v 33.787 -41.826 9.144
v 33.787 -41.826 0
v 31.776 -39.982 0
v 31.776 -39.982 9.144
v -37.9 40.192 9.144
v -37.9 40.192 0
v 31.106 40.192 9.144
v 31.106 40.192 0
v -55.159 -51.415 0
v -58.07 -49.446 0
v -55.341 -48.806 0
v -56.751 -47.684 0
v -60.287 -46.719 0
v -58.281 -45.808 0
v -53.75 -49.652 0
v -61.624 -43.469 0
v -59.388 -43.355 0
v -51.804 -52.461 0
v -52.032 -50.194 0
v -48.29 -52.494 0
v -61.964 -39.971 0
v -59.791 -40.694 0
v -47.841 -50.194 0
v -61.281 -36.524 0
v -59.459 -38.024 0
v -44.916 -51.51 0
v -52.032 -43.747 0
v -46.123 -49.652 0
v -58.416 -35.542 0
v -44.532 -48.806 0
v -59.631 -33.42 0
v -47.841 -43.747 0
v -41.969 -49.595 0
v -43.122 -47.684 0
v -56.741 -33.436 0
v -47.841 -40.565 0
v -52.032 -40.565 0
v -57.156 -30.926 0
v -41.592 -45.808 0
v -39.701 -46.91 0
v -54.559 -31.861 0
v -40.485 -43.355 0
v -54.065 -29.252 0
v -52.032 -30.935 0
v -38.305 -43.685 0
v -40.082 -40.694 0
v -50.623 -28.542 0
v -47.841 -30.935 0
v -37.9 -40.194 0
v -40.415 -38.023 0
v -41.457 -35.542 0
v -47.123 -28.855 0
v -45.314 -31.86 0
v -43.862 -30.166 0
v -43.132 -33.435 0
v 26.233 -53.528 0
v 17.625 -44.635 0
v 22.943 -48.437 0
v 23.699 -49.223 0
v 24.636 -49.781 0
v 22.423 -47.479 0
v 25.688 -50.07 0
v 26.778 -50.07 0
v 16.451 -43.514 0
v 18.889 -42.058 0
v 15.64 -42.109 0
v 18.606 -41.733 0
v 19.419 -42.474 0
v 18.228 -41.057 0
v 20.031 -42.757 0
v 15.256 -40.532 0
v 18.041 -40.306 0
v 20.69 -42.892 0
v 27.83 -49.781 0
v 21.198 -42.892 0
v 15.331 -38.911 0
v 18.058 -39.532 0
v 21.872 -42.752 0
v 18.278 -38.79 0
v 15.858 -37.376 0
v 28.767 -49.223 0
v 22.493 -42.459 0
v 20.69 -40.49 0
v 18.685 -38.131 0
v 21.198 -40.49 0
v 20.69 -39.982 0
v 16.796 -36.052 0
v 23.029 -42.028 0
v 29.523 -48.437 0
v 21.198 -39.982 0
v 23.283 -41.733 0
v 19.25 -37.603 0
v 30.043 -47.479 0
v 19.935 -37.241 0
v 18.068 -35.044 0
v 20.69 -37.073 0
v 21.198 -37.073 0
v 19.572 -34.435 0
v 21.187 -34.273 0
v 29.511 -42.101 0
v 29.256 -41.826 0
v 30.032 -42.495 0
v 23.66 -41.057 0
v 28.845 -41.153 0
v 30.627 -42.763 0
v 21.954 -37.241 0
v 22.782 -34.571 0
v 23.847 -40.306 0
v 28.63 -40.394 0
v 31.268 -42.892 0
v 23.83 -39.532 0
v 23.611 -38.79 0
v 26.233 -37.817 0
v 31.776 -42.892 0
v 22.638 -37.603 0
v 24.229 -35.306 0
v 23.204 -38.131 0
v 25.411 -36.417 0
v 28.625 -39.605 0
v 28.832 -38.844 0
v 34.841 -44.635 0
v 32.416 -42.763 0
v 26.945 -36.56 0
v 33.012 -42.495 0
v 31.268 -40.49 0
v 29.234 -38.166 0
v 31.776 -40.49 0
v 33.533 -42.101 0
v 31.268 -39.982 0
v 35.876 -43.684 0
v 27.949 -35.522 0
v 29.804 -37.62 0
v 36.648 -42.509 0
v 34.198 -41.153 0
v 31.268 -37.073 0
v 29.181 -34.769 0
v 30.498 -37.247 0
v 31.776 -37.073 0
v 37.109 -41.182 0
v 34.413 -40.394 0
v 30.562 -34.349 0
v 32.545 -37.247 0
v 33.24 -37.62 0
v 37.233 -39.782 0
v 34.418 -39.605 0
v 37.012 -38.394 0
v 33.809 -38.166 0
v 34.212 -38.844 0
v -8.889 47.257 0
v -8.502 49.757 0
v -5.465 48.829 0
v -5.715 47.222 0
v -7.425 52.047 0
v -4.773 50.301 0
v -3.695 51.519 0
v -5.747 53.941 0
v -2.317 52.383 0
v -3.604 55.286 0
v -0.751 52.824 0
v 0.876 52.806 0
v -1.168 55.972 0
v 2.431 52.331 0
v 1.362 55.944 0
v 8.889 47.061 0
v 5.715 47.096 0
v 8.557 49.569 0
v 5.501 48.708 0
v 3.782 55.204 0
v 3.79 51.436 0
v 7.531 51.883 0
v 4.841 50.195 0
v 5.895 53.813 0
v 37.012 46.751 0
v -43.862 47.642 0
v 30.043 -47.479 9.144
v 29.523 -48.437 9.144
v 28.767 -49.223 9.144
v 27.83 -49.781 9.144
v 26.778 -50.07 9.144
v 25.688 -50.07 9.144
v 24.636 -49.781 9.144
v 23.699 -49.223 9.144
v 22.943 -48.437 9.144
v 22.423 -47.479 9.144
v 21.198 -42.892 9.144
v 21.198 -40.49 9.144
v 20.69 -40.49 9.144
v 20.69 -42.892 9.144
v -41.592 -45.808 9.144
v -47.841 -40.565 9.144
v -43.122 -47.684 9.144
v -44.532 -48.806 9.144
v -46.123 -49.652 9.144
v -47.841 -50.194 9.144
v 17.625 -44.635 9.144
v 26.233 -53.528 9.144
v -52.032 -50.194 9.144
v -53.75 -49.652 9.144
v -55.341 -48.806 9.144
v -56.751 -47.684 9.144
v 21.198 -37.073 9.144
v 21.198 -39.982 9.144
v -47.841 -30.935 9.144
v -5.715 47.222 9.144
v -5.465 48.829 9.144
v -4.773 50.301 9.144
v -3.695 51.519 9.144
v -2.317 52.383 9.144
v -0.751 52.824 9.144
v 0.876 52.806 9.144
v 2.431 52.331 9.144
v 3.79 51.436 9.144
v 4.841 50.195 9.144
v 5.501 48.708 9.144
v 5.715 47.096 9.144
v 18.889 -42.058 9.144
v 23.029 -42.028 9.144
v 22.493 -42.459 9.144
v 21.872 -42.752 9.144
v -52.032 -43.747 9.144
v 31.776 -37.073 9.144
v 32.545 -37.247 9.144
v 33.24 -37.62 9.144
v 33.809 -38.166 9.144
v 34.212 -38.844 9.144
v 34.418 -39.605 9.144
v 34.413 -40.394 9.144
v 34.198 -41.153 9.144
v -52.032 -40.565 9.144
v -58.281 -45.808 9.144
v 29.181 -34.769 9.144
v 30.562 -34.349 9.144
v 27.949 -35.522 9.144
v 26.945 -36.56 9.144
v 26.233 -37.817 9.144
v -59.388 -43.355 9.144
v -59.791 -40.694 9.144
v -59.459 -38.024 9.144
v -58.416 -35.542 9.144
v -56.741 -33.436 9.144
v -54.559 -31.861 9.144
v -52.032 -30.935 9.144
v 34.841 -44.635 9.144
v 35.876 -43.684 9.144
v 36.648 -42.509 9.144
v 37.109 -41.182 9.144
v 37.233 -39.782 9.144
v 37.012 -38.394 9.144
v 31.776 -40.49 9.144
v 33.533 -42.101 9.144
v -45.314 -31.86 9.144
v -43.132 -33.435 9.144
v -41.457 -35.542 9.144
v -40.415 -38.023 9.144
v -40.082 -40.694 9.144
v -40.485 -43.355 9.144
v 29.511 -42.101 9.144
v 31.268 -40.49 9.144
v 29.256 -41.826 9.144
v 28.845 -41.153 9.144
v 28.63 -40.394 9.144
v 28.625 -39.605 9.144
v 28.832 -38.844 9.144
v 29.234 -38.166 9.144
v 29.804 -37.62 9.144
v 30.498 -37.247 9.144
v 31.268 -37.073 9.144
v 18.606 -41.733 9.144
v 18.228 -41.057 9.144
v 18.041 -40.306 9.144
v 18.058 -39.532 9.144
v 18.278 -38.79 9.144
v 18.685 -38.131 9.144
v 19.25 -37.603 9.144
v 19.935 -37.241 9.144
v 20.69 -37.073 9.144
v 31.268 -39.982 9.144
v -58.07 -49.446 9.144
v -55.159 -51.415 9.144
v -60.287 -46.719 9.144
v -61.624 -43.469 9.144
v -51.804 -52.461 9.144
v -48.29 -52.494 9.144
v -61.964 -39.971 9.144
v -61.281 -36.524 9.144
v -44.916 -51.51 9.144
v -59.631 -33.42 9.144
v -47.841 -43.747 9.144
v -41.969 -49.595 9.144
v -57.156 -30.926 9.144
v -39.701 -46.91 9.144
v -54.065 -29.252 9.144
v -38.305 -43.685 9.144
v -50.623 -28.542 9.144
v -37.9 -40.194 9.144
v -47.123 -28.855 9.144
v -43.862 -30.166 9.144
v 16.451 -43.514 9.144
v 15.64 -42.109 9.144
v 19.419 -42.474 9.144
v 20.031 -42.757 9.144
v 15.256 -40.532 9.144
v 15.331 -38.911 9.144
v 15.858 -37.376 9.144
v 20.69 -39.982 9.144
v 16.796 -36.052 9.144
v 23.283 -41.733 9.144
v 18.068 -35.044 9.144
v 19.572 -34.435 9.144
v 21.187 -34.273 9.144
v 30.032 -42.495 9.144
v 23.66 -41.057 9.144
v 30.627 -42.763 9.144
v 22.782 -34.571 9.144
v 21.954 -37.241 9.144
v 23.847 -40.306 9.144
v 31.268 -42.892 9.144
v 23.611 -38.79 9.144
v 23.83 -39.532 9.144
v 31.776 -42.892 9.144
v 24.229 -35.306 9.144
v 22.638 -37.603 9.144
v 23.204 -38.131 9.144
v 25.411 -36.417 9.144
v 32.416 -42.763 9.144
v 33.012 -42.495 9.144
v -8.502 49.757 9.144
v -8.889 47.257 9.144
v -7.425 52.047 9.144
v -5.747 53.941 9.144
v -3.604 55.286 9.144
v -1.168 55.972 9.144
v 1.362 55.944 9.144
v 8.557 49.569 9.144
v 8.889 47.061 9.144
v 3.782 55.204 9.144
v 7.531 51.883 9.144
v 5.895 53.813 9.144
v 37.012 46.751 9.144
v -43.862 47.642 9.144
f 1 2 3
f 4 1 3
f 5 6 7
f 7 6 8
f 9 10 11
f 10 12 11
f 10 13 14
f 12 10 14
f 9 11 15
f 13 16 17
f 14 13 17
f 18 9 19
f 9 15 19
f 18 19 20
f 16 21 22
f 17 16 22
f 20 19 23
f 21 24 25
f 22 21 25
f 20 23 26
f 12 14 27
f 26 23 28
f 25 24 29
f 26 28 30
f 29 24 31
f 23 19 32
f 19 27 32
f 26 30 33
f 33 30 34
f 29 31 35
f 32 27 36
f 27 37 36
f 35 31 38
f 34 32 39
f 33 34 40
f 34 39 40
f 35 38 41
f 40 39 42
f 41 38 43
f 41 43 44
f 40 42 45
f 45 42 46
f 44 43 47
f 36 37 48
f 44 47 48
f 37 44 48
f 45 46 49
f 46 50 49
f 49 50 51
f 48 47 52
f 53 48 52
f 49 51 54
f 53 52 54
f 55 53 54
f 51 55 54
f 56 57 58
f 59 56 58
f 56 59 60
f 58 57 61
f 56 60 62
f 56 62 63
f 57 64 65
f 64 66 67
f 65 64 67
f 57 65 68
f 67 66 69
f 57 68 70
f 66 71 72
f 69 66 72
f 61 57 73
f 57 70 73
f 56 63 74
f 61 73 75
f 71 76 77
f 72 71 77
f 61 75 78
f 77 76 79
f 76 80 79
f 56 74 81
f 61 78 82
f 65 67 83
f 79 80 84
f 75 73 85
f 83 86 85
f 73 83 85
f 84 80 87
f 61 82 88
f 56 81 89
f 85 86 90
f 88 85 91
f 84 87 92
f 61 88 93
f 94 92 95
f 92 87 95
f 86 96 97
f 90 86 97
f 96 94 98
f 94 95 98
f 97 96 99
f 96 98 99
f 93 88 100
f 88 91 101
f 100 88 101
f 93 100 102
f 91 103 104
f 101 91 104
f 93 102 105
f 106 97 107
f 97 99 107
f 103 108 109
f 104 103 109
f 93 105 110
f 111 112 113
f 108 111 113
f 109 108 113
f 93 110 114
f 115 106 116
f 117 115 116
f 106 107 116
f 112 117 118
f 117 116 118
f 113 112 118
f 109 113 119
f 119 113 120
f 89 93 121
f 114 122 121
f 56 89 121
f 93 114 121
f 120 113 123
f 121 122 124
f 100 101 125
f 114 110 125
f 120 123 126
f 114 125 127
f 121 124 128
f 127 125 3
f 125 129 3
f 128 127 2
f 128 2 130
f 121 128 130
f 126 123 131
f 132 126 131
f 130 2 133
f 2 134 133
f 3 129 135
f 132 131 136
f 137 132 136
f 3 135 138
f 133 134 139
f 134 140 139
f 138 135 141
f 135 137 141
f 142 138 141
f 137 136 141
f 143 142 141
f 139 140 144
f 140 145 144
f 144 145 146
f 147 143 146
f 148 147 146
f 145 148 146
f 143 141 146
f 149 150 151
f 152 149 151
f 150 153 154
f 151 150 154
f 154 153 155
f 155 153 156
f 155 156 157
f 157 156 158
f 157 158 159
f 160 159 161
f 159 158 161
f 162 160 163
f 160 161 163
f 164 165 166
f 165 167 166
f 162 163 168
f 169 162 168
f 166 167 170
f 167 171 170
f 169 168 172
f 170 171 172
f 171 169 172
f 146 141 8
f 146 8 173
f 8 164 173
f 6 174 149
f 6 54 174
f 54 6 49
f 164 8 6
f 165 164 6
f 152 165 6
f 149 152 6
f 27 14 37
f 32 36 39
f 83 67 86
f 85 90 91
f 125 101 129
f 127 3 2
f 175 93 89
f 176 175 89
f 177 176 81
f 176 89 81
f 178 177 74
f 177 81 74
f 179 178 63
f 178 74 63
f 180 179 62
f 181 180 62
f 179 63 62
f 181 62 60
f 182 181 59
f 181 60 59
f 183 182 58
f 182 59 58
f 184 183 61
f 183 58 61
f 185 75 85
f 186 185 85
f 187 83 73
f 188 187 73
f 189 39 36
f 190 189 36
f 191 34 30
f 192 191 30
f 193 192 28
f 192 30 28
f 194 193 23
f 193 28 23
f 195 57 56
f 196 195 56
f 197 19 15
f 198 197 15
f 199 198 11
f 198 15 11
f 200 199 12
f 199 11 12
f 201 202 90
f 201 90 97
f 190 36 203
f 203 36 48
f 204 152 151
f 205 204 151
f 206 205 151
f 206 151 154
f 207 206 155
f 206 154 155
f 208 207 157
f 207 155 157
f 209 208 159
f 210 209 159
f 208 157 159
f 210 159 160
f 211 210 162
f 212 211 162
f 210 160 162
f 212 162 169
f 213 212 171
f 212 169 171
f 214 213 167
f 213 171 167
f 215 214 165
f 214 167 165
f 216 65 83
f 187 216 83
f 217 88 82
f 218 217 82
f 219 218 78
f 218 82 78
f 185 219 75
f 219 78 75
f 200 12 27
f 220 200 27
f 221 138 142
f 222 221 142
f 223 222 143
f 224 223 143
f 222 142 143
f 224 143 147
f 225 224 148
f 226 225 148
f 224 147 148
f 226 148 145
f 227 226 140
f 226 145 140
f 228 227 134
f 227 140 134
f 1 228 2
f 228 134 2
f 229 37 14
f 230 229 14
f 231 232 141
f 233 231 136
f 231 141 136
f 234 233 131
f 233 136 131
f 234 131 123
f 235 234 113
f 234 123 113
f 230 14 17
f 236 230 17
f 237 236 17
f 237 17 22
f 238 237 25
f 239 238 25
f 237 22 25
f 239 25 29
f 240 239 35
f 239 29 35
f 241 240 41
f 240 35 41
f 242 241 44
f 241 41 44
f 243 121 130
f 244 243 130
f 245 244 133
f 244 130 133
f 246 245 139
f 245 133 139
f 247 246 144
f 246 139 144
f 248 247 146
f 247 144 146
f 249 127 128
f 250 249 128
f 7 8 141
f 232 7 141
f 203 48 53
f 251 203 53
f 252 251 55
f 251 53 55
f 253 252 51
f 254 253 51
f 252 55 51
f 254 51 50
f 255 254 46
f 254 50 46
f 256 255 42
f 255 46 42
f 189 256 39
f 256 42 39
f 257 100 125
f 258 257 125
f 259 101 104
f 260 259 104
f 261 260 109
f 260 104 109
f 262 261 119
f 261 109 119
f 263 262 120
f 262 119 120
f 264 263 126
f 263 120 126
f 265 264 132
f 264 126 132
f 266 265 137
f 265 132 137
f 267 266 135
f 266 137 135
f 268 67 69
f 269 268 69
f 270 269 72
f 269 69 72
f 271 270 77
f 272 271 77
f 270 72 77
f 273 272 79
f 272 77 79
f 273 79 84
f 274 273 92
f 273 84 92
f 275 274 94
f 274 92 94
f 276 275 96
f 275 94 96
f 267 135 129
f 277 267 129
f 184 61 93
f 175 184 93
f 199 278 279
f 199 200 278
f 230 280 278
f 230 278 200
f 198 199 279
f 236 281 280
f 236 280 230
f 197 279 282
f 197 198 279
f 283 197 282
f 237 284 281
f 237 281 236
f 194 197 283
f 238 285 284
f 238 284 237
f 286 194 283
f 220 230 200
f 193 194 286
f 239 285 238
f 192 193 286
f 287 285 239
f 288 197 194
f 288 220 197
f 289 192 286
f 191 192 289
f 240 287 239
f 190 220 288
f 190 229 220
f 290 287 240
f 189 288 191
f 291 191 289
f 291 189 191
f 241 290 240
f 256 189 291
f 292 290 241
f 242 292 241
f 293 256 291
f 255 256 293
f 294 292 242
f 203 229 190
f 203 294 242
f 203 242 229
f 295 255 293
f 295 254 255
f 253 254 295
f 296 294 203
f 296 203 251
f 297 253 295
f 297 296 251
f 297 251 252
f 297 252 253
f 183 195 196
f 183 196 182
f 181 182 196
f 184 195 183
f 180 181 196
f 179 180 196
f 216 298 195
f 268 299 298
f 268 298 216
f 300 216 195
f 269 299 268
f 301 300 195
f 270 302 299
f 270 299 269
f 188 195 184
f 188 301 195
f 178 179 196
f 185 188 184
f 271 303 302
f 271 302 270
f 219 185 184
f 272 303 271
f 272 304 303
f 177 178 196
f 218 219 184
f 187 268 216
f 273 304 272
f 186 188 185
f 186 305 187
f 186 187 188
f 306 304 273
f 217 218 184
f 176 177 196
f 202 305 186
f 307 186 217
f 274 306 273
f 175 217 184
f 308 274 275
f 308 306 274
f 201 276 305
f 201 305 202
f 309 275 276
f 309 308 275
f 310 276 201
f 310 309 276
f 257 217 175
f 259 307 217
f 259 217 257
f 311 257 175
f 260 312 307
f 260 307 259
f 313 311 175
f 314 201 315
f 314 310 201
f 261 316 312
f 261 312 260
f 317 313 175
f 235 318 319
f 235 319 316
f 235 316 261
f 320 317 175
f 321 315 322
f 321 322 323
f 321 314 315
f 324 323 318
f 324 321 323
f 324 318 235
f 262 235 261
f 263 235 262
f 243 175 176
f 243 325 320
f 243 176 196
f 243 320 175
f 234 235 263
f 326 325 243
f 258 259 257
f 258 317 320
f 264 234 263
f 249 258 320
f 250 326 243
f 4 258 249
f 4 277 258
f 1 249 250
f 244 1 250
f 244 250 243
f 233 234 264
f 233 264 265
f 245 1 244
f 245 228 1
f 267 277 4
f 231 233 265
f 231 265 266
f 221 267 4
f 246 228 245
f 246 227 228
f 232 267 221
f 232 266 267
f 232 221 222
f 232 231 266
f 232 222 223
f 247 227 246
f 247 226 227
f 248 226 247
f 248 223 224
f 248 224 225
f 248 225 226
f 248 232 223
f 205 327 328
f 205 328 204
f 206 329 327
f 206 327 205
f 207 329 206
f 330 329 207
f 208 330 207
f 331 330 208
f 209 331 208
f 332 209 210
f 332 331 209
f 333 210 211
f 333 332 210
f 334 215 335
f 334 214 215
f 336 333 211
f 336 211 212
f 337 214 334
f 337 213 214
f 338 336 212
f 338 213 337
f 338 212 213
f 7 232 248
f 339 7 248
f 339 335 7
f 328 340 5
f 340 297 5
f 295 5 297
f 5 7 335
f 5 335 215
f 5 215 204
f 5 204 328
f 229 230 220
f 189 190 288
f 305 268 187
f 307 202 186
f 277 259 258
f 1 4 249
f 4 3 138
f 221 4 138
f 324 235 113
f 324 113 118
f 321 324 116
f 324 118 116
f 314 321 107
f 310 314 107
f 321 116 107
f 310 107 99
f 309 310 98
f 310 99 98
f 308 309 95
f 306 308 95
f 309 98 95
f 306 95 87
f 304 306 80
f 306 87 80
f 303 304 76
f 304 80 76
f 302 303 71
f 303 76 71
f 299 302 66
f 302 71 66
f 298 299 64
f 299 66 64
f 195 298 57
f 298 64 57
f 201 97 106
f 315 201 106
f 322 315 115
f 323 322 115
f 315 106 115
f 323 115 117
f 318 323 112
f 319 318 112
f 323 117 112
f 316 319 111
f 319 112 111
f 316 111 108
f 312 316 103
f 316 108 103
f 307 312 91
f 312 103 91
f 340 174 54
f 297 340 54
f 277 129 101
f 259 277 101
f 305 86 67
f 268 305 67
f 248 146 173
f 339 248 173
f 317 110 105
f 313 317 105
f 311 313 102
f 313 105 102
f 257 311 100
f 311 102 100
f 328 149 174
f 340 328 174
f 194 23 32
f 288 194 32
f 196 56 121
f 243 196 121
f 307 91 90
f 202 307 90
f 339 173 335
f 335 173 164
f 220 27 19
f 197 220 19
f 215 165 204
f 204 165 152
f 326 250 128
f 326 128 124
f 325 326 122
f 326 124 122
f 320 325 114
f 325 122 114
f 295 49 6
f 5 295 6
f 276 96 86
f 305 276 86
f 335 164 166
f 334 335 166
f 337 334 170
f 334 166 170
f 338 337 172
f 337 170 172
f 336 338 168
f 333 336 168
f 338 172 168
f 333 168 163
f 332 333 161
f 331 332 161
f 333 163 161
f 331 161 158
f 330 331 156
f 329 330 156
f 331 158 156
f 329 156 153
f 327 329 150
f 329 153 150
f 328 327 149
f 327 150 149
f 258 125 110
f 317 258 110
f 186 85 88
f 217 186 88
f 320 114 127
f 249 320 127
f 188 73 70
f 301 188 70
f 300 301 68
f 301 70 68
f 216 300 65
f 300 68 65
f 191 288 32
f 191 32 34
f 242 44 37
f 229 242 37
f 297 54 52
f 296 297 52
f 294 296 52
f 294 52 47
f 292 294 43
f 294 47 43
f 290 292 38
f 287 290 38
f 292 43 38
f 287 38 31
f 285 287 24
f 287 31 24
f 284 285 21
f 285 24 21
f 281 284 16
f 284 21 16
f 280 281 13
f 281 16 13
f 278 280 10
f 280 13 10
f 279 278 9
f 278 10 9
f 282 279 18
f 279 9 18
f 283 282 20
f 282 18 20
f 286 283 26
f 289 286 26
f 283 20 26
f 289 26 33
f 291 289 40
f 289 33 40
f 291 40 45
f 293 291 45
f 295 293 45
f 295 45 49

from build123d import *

# Parameters (mm, degrees)
F1_DEPTH = 9.144


with BuildPart() as f1:
    # F0 (on Top) → F1 (new body)
    with BuildSketch(Plane.XY):
        with BuildLine():
            Line((26.232975, -53.528168), (34.841218, -44.634543))
            ThreePointArc((34.841218, -44.634543), (36.919466, -41.859873), (37.011544, -38.394412))
            Line((37.011544, -38.394412), (37.011544, -23.138775))
            Line((37.011544, -23.138775), (37.011544, 46.751468))
            Line((37.011544, 46.751468), (8.889462, 47.060993))
            ThreePointArc((8.889462, 47.060993), (0.097842, 56.048297), (-8.889462, 47.256677))
            Line((-8.889462, 47.256677), (-43.862213, 47.641603))
            Line((-43.862213, 47.641603), (-43.862213, -30.166319))
            ThreePointArc((-43.862213, -30.166319), (-60.287374, -46.719226), (-37.899839, -40.193666))
            Line((-37.899839, -40.193666), (-37.899839, 40.192322))
            Line((-37.899839, 40.192322), (31.105572, 40.192322))
            Line((31.105572, 40.192322), (30.562247, -34.348597))
            ThreePointArc((30.562247, -34.348597), (27.948657, -35.522102), (26.232975, -37.816531))
            ThreePointArc((26.232975, -37.816531), (17.395999, -35.502474), (17.624733, -44.634543))
            Line((17.624733, -44.634543), (26.232975, -53.528168))
        make_face()
        with BuildLine():
            Line((-52.031719, -43.74671), (-52.031719, -50.194425))
            ThreePointArc((-52.031719, -50.194425), (-54.56503, -49.26521), (-56.75136, -47.683736))
            Line((-56.75136, -47.683736), (-52.031719, -43.74671))
        make_face(mode=Mode.SUBTRACT)
        with BuildLine():
            ThreePointArc((-43.121746, -47.683736), (-45.308076, -49.26521), (-47.841386, -50.194425))
            Line((-47.841386, -50.194425), (-47.841386, -43.74671))
            Line((-47.841386, -43.74671), (-43.121746, -47.683736))
        make_face(mode=Mode.SUBTRACT)
        with BuildLine():
            Line((-52.031719, -30.934597), (-52.031719, -40.564511))
            Line((-52.031719, -40.564511), (-58.280842, -45.808346))
            ThreePointArc((-58.280842, -45.808346), (-59.022402, -36.747142), (-52.031719, -30.934597))
        make_face(mode=Mode.SUBTRACT)
        with BuildLine():
            Line((-41.59198, -45.807894), (-47.841386, -40.564511))
            Line((-47.841386, -40.564511), (-47.841386, -30.934597))
            ThreePointArc((-47.841386, -30.934597), (-40.850807, -36.746896), (-41.59198, -45.807894))
        make_face(mode=Mode.SUBTRACT)
        with BuildLine():
            Line((18.88916, -42.058198), (20.690326, -40.490497))
            Line((20.690326, -40.490497), (20.690326, -42.892432))
            ThreePointArc((20.690326, -42.892432), (19.716707, -42.633005), (18.88916, -42.058198))
        make_face(mode=Mode.SUBTRACT)
        with BuildLine():
            Line((21.198326, -42.892432), (21.198326, -40.490497))
            Line((21.198326, -40.490497), (23.02938, -42.028172))
            ThreePointArc((23.02938, -42.028172), (22.191134, -42.624032), (21.198326, -42.892432))
        make_face(mode=Mode.SUBTRACT)
        with BuildLine():
            Line((22.422975, -47.479119), (26.232975, -47.479119))
            Line((26.232975, -47.479119), (30.042975, -47.479119))
            ThreePointArc((30.042975, -47.479119), (26.232975, -50.106314), (22.422975, -47.479119))
        make_face(mode=Mode.SUBTRACT)
        with BuildLine():
            Line((29.510517, -42.100913), (31.267625, -40.490497))
            Line((31.267625, -40.490497), (31.267625, -42.892432))
            ThreePointArc((31.267625, -42.892432), (30.321915, -42.645753), (29.510517, -42.100913))
        make_face(mode=Mode.SUBTRACT)
        with BuildLine():
            ThreePointArc((33.532733, -42.100913), (32.721335, -42.645753), (31.775625, -42.892432))
            Line((31.775625, -42.892432), (31.775625, -40.490497))
            Line((31.775625, -40.490497), (33.532733, -42.100913))
        make_face(mode=Mode.SUBTRACT)
        with BuildLine():
            ThreePointArc((18.605909, -41.732939), (18.277879, -38.789893), (20.690326, -37.072561))
            Line((20.690326, -37.072561), (20.690326, -39.982497))
            Line((20.690326, -39.982497), (18.605909, -41.732939))
        make_face(mode=Mode.SUBTRACT)
        with BuildLine():
            ThreePointArc((21.198326, -37.072561), (23.610772, -38.789893), (23.282742, -41.732939))
            Line((23.282742, -41.732939), (21.198326, -39.982497))
            Line((21.198326, -39.982497), (21.198326, -37.072561))
        make_face(mode=Mode.SUBTRACT)
        with BuildLine():
            ThreePointArc((29.255999, -41.826183), (28.831577, -38.844128), (31.267625, -37.072561))
            Line((31.267625, -37.072561), (31.267625, -39.982497))
            Line((31.267625, -39.982497), (29.255999, -41.826183))
        make_face(mode=Mode.SUBTRACT)
        with BuildLine():
            Line((31.775625, -39.982497), (31.775625, -37.072561))
            ThreePointArc((31.775625, -37.072561), (34.211673, -38.844128), (33.787252, -41.826183))
            Line((33.787252, -41.826183), (31.775625, -39.982497))
        make_face(mode=Mode.SUBTRACT)
        with BuildLine():
            ThreePointArc((-5.714654, 47.221733), (0.062898, 52.873489), (5.714654, 47.095937))
            Line((5.714654, 47.095937), (-5.714654, 47.221733))
        make_face(mode=Mode.SUBTRACT)
    extrude(amount=F1_DEPTH)


solid = f1.part
